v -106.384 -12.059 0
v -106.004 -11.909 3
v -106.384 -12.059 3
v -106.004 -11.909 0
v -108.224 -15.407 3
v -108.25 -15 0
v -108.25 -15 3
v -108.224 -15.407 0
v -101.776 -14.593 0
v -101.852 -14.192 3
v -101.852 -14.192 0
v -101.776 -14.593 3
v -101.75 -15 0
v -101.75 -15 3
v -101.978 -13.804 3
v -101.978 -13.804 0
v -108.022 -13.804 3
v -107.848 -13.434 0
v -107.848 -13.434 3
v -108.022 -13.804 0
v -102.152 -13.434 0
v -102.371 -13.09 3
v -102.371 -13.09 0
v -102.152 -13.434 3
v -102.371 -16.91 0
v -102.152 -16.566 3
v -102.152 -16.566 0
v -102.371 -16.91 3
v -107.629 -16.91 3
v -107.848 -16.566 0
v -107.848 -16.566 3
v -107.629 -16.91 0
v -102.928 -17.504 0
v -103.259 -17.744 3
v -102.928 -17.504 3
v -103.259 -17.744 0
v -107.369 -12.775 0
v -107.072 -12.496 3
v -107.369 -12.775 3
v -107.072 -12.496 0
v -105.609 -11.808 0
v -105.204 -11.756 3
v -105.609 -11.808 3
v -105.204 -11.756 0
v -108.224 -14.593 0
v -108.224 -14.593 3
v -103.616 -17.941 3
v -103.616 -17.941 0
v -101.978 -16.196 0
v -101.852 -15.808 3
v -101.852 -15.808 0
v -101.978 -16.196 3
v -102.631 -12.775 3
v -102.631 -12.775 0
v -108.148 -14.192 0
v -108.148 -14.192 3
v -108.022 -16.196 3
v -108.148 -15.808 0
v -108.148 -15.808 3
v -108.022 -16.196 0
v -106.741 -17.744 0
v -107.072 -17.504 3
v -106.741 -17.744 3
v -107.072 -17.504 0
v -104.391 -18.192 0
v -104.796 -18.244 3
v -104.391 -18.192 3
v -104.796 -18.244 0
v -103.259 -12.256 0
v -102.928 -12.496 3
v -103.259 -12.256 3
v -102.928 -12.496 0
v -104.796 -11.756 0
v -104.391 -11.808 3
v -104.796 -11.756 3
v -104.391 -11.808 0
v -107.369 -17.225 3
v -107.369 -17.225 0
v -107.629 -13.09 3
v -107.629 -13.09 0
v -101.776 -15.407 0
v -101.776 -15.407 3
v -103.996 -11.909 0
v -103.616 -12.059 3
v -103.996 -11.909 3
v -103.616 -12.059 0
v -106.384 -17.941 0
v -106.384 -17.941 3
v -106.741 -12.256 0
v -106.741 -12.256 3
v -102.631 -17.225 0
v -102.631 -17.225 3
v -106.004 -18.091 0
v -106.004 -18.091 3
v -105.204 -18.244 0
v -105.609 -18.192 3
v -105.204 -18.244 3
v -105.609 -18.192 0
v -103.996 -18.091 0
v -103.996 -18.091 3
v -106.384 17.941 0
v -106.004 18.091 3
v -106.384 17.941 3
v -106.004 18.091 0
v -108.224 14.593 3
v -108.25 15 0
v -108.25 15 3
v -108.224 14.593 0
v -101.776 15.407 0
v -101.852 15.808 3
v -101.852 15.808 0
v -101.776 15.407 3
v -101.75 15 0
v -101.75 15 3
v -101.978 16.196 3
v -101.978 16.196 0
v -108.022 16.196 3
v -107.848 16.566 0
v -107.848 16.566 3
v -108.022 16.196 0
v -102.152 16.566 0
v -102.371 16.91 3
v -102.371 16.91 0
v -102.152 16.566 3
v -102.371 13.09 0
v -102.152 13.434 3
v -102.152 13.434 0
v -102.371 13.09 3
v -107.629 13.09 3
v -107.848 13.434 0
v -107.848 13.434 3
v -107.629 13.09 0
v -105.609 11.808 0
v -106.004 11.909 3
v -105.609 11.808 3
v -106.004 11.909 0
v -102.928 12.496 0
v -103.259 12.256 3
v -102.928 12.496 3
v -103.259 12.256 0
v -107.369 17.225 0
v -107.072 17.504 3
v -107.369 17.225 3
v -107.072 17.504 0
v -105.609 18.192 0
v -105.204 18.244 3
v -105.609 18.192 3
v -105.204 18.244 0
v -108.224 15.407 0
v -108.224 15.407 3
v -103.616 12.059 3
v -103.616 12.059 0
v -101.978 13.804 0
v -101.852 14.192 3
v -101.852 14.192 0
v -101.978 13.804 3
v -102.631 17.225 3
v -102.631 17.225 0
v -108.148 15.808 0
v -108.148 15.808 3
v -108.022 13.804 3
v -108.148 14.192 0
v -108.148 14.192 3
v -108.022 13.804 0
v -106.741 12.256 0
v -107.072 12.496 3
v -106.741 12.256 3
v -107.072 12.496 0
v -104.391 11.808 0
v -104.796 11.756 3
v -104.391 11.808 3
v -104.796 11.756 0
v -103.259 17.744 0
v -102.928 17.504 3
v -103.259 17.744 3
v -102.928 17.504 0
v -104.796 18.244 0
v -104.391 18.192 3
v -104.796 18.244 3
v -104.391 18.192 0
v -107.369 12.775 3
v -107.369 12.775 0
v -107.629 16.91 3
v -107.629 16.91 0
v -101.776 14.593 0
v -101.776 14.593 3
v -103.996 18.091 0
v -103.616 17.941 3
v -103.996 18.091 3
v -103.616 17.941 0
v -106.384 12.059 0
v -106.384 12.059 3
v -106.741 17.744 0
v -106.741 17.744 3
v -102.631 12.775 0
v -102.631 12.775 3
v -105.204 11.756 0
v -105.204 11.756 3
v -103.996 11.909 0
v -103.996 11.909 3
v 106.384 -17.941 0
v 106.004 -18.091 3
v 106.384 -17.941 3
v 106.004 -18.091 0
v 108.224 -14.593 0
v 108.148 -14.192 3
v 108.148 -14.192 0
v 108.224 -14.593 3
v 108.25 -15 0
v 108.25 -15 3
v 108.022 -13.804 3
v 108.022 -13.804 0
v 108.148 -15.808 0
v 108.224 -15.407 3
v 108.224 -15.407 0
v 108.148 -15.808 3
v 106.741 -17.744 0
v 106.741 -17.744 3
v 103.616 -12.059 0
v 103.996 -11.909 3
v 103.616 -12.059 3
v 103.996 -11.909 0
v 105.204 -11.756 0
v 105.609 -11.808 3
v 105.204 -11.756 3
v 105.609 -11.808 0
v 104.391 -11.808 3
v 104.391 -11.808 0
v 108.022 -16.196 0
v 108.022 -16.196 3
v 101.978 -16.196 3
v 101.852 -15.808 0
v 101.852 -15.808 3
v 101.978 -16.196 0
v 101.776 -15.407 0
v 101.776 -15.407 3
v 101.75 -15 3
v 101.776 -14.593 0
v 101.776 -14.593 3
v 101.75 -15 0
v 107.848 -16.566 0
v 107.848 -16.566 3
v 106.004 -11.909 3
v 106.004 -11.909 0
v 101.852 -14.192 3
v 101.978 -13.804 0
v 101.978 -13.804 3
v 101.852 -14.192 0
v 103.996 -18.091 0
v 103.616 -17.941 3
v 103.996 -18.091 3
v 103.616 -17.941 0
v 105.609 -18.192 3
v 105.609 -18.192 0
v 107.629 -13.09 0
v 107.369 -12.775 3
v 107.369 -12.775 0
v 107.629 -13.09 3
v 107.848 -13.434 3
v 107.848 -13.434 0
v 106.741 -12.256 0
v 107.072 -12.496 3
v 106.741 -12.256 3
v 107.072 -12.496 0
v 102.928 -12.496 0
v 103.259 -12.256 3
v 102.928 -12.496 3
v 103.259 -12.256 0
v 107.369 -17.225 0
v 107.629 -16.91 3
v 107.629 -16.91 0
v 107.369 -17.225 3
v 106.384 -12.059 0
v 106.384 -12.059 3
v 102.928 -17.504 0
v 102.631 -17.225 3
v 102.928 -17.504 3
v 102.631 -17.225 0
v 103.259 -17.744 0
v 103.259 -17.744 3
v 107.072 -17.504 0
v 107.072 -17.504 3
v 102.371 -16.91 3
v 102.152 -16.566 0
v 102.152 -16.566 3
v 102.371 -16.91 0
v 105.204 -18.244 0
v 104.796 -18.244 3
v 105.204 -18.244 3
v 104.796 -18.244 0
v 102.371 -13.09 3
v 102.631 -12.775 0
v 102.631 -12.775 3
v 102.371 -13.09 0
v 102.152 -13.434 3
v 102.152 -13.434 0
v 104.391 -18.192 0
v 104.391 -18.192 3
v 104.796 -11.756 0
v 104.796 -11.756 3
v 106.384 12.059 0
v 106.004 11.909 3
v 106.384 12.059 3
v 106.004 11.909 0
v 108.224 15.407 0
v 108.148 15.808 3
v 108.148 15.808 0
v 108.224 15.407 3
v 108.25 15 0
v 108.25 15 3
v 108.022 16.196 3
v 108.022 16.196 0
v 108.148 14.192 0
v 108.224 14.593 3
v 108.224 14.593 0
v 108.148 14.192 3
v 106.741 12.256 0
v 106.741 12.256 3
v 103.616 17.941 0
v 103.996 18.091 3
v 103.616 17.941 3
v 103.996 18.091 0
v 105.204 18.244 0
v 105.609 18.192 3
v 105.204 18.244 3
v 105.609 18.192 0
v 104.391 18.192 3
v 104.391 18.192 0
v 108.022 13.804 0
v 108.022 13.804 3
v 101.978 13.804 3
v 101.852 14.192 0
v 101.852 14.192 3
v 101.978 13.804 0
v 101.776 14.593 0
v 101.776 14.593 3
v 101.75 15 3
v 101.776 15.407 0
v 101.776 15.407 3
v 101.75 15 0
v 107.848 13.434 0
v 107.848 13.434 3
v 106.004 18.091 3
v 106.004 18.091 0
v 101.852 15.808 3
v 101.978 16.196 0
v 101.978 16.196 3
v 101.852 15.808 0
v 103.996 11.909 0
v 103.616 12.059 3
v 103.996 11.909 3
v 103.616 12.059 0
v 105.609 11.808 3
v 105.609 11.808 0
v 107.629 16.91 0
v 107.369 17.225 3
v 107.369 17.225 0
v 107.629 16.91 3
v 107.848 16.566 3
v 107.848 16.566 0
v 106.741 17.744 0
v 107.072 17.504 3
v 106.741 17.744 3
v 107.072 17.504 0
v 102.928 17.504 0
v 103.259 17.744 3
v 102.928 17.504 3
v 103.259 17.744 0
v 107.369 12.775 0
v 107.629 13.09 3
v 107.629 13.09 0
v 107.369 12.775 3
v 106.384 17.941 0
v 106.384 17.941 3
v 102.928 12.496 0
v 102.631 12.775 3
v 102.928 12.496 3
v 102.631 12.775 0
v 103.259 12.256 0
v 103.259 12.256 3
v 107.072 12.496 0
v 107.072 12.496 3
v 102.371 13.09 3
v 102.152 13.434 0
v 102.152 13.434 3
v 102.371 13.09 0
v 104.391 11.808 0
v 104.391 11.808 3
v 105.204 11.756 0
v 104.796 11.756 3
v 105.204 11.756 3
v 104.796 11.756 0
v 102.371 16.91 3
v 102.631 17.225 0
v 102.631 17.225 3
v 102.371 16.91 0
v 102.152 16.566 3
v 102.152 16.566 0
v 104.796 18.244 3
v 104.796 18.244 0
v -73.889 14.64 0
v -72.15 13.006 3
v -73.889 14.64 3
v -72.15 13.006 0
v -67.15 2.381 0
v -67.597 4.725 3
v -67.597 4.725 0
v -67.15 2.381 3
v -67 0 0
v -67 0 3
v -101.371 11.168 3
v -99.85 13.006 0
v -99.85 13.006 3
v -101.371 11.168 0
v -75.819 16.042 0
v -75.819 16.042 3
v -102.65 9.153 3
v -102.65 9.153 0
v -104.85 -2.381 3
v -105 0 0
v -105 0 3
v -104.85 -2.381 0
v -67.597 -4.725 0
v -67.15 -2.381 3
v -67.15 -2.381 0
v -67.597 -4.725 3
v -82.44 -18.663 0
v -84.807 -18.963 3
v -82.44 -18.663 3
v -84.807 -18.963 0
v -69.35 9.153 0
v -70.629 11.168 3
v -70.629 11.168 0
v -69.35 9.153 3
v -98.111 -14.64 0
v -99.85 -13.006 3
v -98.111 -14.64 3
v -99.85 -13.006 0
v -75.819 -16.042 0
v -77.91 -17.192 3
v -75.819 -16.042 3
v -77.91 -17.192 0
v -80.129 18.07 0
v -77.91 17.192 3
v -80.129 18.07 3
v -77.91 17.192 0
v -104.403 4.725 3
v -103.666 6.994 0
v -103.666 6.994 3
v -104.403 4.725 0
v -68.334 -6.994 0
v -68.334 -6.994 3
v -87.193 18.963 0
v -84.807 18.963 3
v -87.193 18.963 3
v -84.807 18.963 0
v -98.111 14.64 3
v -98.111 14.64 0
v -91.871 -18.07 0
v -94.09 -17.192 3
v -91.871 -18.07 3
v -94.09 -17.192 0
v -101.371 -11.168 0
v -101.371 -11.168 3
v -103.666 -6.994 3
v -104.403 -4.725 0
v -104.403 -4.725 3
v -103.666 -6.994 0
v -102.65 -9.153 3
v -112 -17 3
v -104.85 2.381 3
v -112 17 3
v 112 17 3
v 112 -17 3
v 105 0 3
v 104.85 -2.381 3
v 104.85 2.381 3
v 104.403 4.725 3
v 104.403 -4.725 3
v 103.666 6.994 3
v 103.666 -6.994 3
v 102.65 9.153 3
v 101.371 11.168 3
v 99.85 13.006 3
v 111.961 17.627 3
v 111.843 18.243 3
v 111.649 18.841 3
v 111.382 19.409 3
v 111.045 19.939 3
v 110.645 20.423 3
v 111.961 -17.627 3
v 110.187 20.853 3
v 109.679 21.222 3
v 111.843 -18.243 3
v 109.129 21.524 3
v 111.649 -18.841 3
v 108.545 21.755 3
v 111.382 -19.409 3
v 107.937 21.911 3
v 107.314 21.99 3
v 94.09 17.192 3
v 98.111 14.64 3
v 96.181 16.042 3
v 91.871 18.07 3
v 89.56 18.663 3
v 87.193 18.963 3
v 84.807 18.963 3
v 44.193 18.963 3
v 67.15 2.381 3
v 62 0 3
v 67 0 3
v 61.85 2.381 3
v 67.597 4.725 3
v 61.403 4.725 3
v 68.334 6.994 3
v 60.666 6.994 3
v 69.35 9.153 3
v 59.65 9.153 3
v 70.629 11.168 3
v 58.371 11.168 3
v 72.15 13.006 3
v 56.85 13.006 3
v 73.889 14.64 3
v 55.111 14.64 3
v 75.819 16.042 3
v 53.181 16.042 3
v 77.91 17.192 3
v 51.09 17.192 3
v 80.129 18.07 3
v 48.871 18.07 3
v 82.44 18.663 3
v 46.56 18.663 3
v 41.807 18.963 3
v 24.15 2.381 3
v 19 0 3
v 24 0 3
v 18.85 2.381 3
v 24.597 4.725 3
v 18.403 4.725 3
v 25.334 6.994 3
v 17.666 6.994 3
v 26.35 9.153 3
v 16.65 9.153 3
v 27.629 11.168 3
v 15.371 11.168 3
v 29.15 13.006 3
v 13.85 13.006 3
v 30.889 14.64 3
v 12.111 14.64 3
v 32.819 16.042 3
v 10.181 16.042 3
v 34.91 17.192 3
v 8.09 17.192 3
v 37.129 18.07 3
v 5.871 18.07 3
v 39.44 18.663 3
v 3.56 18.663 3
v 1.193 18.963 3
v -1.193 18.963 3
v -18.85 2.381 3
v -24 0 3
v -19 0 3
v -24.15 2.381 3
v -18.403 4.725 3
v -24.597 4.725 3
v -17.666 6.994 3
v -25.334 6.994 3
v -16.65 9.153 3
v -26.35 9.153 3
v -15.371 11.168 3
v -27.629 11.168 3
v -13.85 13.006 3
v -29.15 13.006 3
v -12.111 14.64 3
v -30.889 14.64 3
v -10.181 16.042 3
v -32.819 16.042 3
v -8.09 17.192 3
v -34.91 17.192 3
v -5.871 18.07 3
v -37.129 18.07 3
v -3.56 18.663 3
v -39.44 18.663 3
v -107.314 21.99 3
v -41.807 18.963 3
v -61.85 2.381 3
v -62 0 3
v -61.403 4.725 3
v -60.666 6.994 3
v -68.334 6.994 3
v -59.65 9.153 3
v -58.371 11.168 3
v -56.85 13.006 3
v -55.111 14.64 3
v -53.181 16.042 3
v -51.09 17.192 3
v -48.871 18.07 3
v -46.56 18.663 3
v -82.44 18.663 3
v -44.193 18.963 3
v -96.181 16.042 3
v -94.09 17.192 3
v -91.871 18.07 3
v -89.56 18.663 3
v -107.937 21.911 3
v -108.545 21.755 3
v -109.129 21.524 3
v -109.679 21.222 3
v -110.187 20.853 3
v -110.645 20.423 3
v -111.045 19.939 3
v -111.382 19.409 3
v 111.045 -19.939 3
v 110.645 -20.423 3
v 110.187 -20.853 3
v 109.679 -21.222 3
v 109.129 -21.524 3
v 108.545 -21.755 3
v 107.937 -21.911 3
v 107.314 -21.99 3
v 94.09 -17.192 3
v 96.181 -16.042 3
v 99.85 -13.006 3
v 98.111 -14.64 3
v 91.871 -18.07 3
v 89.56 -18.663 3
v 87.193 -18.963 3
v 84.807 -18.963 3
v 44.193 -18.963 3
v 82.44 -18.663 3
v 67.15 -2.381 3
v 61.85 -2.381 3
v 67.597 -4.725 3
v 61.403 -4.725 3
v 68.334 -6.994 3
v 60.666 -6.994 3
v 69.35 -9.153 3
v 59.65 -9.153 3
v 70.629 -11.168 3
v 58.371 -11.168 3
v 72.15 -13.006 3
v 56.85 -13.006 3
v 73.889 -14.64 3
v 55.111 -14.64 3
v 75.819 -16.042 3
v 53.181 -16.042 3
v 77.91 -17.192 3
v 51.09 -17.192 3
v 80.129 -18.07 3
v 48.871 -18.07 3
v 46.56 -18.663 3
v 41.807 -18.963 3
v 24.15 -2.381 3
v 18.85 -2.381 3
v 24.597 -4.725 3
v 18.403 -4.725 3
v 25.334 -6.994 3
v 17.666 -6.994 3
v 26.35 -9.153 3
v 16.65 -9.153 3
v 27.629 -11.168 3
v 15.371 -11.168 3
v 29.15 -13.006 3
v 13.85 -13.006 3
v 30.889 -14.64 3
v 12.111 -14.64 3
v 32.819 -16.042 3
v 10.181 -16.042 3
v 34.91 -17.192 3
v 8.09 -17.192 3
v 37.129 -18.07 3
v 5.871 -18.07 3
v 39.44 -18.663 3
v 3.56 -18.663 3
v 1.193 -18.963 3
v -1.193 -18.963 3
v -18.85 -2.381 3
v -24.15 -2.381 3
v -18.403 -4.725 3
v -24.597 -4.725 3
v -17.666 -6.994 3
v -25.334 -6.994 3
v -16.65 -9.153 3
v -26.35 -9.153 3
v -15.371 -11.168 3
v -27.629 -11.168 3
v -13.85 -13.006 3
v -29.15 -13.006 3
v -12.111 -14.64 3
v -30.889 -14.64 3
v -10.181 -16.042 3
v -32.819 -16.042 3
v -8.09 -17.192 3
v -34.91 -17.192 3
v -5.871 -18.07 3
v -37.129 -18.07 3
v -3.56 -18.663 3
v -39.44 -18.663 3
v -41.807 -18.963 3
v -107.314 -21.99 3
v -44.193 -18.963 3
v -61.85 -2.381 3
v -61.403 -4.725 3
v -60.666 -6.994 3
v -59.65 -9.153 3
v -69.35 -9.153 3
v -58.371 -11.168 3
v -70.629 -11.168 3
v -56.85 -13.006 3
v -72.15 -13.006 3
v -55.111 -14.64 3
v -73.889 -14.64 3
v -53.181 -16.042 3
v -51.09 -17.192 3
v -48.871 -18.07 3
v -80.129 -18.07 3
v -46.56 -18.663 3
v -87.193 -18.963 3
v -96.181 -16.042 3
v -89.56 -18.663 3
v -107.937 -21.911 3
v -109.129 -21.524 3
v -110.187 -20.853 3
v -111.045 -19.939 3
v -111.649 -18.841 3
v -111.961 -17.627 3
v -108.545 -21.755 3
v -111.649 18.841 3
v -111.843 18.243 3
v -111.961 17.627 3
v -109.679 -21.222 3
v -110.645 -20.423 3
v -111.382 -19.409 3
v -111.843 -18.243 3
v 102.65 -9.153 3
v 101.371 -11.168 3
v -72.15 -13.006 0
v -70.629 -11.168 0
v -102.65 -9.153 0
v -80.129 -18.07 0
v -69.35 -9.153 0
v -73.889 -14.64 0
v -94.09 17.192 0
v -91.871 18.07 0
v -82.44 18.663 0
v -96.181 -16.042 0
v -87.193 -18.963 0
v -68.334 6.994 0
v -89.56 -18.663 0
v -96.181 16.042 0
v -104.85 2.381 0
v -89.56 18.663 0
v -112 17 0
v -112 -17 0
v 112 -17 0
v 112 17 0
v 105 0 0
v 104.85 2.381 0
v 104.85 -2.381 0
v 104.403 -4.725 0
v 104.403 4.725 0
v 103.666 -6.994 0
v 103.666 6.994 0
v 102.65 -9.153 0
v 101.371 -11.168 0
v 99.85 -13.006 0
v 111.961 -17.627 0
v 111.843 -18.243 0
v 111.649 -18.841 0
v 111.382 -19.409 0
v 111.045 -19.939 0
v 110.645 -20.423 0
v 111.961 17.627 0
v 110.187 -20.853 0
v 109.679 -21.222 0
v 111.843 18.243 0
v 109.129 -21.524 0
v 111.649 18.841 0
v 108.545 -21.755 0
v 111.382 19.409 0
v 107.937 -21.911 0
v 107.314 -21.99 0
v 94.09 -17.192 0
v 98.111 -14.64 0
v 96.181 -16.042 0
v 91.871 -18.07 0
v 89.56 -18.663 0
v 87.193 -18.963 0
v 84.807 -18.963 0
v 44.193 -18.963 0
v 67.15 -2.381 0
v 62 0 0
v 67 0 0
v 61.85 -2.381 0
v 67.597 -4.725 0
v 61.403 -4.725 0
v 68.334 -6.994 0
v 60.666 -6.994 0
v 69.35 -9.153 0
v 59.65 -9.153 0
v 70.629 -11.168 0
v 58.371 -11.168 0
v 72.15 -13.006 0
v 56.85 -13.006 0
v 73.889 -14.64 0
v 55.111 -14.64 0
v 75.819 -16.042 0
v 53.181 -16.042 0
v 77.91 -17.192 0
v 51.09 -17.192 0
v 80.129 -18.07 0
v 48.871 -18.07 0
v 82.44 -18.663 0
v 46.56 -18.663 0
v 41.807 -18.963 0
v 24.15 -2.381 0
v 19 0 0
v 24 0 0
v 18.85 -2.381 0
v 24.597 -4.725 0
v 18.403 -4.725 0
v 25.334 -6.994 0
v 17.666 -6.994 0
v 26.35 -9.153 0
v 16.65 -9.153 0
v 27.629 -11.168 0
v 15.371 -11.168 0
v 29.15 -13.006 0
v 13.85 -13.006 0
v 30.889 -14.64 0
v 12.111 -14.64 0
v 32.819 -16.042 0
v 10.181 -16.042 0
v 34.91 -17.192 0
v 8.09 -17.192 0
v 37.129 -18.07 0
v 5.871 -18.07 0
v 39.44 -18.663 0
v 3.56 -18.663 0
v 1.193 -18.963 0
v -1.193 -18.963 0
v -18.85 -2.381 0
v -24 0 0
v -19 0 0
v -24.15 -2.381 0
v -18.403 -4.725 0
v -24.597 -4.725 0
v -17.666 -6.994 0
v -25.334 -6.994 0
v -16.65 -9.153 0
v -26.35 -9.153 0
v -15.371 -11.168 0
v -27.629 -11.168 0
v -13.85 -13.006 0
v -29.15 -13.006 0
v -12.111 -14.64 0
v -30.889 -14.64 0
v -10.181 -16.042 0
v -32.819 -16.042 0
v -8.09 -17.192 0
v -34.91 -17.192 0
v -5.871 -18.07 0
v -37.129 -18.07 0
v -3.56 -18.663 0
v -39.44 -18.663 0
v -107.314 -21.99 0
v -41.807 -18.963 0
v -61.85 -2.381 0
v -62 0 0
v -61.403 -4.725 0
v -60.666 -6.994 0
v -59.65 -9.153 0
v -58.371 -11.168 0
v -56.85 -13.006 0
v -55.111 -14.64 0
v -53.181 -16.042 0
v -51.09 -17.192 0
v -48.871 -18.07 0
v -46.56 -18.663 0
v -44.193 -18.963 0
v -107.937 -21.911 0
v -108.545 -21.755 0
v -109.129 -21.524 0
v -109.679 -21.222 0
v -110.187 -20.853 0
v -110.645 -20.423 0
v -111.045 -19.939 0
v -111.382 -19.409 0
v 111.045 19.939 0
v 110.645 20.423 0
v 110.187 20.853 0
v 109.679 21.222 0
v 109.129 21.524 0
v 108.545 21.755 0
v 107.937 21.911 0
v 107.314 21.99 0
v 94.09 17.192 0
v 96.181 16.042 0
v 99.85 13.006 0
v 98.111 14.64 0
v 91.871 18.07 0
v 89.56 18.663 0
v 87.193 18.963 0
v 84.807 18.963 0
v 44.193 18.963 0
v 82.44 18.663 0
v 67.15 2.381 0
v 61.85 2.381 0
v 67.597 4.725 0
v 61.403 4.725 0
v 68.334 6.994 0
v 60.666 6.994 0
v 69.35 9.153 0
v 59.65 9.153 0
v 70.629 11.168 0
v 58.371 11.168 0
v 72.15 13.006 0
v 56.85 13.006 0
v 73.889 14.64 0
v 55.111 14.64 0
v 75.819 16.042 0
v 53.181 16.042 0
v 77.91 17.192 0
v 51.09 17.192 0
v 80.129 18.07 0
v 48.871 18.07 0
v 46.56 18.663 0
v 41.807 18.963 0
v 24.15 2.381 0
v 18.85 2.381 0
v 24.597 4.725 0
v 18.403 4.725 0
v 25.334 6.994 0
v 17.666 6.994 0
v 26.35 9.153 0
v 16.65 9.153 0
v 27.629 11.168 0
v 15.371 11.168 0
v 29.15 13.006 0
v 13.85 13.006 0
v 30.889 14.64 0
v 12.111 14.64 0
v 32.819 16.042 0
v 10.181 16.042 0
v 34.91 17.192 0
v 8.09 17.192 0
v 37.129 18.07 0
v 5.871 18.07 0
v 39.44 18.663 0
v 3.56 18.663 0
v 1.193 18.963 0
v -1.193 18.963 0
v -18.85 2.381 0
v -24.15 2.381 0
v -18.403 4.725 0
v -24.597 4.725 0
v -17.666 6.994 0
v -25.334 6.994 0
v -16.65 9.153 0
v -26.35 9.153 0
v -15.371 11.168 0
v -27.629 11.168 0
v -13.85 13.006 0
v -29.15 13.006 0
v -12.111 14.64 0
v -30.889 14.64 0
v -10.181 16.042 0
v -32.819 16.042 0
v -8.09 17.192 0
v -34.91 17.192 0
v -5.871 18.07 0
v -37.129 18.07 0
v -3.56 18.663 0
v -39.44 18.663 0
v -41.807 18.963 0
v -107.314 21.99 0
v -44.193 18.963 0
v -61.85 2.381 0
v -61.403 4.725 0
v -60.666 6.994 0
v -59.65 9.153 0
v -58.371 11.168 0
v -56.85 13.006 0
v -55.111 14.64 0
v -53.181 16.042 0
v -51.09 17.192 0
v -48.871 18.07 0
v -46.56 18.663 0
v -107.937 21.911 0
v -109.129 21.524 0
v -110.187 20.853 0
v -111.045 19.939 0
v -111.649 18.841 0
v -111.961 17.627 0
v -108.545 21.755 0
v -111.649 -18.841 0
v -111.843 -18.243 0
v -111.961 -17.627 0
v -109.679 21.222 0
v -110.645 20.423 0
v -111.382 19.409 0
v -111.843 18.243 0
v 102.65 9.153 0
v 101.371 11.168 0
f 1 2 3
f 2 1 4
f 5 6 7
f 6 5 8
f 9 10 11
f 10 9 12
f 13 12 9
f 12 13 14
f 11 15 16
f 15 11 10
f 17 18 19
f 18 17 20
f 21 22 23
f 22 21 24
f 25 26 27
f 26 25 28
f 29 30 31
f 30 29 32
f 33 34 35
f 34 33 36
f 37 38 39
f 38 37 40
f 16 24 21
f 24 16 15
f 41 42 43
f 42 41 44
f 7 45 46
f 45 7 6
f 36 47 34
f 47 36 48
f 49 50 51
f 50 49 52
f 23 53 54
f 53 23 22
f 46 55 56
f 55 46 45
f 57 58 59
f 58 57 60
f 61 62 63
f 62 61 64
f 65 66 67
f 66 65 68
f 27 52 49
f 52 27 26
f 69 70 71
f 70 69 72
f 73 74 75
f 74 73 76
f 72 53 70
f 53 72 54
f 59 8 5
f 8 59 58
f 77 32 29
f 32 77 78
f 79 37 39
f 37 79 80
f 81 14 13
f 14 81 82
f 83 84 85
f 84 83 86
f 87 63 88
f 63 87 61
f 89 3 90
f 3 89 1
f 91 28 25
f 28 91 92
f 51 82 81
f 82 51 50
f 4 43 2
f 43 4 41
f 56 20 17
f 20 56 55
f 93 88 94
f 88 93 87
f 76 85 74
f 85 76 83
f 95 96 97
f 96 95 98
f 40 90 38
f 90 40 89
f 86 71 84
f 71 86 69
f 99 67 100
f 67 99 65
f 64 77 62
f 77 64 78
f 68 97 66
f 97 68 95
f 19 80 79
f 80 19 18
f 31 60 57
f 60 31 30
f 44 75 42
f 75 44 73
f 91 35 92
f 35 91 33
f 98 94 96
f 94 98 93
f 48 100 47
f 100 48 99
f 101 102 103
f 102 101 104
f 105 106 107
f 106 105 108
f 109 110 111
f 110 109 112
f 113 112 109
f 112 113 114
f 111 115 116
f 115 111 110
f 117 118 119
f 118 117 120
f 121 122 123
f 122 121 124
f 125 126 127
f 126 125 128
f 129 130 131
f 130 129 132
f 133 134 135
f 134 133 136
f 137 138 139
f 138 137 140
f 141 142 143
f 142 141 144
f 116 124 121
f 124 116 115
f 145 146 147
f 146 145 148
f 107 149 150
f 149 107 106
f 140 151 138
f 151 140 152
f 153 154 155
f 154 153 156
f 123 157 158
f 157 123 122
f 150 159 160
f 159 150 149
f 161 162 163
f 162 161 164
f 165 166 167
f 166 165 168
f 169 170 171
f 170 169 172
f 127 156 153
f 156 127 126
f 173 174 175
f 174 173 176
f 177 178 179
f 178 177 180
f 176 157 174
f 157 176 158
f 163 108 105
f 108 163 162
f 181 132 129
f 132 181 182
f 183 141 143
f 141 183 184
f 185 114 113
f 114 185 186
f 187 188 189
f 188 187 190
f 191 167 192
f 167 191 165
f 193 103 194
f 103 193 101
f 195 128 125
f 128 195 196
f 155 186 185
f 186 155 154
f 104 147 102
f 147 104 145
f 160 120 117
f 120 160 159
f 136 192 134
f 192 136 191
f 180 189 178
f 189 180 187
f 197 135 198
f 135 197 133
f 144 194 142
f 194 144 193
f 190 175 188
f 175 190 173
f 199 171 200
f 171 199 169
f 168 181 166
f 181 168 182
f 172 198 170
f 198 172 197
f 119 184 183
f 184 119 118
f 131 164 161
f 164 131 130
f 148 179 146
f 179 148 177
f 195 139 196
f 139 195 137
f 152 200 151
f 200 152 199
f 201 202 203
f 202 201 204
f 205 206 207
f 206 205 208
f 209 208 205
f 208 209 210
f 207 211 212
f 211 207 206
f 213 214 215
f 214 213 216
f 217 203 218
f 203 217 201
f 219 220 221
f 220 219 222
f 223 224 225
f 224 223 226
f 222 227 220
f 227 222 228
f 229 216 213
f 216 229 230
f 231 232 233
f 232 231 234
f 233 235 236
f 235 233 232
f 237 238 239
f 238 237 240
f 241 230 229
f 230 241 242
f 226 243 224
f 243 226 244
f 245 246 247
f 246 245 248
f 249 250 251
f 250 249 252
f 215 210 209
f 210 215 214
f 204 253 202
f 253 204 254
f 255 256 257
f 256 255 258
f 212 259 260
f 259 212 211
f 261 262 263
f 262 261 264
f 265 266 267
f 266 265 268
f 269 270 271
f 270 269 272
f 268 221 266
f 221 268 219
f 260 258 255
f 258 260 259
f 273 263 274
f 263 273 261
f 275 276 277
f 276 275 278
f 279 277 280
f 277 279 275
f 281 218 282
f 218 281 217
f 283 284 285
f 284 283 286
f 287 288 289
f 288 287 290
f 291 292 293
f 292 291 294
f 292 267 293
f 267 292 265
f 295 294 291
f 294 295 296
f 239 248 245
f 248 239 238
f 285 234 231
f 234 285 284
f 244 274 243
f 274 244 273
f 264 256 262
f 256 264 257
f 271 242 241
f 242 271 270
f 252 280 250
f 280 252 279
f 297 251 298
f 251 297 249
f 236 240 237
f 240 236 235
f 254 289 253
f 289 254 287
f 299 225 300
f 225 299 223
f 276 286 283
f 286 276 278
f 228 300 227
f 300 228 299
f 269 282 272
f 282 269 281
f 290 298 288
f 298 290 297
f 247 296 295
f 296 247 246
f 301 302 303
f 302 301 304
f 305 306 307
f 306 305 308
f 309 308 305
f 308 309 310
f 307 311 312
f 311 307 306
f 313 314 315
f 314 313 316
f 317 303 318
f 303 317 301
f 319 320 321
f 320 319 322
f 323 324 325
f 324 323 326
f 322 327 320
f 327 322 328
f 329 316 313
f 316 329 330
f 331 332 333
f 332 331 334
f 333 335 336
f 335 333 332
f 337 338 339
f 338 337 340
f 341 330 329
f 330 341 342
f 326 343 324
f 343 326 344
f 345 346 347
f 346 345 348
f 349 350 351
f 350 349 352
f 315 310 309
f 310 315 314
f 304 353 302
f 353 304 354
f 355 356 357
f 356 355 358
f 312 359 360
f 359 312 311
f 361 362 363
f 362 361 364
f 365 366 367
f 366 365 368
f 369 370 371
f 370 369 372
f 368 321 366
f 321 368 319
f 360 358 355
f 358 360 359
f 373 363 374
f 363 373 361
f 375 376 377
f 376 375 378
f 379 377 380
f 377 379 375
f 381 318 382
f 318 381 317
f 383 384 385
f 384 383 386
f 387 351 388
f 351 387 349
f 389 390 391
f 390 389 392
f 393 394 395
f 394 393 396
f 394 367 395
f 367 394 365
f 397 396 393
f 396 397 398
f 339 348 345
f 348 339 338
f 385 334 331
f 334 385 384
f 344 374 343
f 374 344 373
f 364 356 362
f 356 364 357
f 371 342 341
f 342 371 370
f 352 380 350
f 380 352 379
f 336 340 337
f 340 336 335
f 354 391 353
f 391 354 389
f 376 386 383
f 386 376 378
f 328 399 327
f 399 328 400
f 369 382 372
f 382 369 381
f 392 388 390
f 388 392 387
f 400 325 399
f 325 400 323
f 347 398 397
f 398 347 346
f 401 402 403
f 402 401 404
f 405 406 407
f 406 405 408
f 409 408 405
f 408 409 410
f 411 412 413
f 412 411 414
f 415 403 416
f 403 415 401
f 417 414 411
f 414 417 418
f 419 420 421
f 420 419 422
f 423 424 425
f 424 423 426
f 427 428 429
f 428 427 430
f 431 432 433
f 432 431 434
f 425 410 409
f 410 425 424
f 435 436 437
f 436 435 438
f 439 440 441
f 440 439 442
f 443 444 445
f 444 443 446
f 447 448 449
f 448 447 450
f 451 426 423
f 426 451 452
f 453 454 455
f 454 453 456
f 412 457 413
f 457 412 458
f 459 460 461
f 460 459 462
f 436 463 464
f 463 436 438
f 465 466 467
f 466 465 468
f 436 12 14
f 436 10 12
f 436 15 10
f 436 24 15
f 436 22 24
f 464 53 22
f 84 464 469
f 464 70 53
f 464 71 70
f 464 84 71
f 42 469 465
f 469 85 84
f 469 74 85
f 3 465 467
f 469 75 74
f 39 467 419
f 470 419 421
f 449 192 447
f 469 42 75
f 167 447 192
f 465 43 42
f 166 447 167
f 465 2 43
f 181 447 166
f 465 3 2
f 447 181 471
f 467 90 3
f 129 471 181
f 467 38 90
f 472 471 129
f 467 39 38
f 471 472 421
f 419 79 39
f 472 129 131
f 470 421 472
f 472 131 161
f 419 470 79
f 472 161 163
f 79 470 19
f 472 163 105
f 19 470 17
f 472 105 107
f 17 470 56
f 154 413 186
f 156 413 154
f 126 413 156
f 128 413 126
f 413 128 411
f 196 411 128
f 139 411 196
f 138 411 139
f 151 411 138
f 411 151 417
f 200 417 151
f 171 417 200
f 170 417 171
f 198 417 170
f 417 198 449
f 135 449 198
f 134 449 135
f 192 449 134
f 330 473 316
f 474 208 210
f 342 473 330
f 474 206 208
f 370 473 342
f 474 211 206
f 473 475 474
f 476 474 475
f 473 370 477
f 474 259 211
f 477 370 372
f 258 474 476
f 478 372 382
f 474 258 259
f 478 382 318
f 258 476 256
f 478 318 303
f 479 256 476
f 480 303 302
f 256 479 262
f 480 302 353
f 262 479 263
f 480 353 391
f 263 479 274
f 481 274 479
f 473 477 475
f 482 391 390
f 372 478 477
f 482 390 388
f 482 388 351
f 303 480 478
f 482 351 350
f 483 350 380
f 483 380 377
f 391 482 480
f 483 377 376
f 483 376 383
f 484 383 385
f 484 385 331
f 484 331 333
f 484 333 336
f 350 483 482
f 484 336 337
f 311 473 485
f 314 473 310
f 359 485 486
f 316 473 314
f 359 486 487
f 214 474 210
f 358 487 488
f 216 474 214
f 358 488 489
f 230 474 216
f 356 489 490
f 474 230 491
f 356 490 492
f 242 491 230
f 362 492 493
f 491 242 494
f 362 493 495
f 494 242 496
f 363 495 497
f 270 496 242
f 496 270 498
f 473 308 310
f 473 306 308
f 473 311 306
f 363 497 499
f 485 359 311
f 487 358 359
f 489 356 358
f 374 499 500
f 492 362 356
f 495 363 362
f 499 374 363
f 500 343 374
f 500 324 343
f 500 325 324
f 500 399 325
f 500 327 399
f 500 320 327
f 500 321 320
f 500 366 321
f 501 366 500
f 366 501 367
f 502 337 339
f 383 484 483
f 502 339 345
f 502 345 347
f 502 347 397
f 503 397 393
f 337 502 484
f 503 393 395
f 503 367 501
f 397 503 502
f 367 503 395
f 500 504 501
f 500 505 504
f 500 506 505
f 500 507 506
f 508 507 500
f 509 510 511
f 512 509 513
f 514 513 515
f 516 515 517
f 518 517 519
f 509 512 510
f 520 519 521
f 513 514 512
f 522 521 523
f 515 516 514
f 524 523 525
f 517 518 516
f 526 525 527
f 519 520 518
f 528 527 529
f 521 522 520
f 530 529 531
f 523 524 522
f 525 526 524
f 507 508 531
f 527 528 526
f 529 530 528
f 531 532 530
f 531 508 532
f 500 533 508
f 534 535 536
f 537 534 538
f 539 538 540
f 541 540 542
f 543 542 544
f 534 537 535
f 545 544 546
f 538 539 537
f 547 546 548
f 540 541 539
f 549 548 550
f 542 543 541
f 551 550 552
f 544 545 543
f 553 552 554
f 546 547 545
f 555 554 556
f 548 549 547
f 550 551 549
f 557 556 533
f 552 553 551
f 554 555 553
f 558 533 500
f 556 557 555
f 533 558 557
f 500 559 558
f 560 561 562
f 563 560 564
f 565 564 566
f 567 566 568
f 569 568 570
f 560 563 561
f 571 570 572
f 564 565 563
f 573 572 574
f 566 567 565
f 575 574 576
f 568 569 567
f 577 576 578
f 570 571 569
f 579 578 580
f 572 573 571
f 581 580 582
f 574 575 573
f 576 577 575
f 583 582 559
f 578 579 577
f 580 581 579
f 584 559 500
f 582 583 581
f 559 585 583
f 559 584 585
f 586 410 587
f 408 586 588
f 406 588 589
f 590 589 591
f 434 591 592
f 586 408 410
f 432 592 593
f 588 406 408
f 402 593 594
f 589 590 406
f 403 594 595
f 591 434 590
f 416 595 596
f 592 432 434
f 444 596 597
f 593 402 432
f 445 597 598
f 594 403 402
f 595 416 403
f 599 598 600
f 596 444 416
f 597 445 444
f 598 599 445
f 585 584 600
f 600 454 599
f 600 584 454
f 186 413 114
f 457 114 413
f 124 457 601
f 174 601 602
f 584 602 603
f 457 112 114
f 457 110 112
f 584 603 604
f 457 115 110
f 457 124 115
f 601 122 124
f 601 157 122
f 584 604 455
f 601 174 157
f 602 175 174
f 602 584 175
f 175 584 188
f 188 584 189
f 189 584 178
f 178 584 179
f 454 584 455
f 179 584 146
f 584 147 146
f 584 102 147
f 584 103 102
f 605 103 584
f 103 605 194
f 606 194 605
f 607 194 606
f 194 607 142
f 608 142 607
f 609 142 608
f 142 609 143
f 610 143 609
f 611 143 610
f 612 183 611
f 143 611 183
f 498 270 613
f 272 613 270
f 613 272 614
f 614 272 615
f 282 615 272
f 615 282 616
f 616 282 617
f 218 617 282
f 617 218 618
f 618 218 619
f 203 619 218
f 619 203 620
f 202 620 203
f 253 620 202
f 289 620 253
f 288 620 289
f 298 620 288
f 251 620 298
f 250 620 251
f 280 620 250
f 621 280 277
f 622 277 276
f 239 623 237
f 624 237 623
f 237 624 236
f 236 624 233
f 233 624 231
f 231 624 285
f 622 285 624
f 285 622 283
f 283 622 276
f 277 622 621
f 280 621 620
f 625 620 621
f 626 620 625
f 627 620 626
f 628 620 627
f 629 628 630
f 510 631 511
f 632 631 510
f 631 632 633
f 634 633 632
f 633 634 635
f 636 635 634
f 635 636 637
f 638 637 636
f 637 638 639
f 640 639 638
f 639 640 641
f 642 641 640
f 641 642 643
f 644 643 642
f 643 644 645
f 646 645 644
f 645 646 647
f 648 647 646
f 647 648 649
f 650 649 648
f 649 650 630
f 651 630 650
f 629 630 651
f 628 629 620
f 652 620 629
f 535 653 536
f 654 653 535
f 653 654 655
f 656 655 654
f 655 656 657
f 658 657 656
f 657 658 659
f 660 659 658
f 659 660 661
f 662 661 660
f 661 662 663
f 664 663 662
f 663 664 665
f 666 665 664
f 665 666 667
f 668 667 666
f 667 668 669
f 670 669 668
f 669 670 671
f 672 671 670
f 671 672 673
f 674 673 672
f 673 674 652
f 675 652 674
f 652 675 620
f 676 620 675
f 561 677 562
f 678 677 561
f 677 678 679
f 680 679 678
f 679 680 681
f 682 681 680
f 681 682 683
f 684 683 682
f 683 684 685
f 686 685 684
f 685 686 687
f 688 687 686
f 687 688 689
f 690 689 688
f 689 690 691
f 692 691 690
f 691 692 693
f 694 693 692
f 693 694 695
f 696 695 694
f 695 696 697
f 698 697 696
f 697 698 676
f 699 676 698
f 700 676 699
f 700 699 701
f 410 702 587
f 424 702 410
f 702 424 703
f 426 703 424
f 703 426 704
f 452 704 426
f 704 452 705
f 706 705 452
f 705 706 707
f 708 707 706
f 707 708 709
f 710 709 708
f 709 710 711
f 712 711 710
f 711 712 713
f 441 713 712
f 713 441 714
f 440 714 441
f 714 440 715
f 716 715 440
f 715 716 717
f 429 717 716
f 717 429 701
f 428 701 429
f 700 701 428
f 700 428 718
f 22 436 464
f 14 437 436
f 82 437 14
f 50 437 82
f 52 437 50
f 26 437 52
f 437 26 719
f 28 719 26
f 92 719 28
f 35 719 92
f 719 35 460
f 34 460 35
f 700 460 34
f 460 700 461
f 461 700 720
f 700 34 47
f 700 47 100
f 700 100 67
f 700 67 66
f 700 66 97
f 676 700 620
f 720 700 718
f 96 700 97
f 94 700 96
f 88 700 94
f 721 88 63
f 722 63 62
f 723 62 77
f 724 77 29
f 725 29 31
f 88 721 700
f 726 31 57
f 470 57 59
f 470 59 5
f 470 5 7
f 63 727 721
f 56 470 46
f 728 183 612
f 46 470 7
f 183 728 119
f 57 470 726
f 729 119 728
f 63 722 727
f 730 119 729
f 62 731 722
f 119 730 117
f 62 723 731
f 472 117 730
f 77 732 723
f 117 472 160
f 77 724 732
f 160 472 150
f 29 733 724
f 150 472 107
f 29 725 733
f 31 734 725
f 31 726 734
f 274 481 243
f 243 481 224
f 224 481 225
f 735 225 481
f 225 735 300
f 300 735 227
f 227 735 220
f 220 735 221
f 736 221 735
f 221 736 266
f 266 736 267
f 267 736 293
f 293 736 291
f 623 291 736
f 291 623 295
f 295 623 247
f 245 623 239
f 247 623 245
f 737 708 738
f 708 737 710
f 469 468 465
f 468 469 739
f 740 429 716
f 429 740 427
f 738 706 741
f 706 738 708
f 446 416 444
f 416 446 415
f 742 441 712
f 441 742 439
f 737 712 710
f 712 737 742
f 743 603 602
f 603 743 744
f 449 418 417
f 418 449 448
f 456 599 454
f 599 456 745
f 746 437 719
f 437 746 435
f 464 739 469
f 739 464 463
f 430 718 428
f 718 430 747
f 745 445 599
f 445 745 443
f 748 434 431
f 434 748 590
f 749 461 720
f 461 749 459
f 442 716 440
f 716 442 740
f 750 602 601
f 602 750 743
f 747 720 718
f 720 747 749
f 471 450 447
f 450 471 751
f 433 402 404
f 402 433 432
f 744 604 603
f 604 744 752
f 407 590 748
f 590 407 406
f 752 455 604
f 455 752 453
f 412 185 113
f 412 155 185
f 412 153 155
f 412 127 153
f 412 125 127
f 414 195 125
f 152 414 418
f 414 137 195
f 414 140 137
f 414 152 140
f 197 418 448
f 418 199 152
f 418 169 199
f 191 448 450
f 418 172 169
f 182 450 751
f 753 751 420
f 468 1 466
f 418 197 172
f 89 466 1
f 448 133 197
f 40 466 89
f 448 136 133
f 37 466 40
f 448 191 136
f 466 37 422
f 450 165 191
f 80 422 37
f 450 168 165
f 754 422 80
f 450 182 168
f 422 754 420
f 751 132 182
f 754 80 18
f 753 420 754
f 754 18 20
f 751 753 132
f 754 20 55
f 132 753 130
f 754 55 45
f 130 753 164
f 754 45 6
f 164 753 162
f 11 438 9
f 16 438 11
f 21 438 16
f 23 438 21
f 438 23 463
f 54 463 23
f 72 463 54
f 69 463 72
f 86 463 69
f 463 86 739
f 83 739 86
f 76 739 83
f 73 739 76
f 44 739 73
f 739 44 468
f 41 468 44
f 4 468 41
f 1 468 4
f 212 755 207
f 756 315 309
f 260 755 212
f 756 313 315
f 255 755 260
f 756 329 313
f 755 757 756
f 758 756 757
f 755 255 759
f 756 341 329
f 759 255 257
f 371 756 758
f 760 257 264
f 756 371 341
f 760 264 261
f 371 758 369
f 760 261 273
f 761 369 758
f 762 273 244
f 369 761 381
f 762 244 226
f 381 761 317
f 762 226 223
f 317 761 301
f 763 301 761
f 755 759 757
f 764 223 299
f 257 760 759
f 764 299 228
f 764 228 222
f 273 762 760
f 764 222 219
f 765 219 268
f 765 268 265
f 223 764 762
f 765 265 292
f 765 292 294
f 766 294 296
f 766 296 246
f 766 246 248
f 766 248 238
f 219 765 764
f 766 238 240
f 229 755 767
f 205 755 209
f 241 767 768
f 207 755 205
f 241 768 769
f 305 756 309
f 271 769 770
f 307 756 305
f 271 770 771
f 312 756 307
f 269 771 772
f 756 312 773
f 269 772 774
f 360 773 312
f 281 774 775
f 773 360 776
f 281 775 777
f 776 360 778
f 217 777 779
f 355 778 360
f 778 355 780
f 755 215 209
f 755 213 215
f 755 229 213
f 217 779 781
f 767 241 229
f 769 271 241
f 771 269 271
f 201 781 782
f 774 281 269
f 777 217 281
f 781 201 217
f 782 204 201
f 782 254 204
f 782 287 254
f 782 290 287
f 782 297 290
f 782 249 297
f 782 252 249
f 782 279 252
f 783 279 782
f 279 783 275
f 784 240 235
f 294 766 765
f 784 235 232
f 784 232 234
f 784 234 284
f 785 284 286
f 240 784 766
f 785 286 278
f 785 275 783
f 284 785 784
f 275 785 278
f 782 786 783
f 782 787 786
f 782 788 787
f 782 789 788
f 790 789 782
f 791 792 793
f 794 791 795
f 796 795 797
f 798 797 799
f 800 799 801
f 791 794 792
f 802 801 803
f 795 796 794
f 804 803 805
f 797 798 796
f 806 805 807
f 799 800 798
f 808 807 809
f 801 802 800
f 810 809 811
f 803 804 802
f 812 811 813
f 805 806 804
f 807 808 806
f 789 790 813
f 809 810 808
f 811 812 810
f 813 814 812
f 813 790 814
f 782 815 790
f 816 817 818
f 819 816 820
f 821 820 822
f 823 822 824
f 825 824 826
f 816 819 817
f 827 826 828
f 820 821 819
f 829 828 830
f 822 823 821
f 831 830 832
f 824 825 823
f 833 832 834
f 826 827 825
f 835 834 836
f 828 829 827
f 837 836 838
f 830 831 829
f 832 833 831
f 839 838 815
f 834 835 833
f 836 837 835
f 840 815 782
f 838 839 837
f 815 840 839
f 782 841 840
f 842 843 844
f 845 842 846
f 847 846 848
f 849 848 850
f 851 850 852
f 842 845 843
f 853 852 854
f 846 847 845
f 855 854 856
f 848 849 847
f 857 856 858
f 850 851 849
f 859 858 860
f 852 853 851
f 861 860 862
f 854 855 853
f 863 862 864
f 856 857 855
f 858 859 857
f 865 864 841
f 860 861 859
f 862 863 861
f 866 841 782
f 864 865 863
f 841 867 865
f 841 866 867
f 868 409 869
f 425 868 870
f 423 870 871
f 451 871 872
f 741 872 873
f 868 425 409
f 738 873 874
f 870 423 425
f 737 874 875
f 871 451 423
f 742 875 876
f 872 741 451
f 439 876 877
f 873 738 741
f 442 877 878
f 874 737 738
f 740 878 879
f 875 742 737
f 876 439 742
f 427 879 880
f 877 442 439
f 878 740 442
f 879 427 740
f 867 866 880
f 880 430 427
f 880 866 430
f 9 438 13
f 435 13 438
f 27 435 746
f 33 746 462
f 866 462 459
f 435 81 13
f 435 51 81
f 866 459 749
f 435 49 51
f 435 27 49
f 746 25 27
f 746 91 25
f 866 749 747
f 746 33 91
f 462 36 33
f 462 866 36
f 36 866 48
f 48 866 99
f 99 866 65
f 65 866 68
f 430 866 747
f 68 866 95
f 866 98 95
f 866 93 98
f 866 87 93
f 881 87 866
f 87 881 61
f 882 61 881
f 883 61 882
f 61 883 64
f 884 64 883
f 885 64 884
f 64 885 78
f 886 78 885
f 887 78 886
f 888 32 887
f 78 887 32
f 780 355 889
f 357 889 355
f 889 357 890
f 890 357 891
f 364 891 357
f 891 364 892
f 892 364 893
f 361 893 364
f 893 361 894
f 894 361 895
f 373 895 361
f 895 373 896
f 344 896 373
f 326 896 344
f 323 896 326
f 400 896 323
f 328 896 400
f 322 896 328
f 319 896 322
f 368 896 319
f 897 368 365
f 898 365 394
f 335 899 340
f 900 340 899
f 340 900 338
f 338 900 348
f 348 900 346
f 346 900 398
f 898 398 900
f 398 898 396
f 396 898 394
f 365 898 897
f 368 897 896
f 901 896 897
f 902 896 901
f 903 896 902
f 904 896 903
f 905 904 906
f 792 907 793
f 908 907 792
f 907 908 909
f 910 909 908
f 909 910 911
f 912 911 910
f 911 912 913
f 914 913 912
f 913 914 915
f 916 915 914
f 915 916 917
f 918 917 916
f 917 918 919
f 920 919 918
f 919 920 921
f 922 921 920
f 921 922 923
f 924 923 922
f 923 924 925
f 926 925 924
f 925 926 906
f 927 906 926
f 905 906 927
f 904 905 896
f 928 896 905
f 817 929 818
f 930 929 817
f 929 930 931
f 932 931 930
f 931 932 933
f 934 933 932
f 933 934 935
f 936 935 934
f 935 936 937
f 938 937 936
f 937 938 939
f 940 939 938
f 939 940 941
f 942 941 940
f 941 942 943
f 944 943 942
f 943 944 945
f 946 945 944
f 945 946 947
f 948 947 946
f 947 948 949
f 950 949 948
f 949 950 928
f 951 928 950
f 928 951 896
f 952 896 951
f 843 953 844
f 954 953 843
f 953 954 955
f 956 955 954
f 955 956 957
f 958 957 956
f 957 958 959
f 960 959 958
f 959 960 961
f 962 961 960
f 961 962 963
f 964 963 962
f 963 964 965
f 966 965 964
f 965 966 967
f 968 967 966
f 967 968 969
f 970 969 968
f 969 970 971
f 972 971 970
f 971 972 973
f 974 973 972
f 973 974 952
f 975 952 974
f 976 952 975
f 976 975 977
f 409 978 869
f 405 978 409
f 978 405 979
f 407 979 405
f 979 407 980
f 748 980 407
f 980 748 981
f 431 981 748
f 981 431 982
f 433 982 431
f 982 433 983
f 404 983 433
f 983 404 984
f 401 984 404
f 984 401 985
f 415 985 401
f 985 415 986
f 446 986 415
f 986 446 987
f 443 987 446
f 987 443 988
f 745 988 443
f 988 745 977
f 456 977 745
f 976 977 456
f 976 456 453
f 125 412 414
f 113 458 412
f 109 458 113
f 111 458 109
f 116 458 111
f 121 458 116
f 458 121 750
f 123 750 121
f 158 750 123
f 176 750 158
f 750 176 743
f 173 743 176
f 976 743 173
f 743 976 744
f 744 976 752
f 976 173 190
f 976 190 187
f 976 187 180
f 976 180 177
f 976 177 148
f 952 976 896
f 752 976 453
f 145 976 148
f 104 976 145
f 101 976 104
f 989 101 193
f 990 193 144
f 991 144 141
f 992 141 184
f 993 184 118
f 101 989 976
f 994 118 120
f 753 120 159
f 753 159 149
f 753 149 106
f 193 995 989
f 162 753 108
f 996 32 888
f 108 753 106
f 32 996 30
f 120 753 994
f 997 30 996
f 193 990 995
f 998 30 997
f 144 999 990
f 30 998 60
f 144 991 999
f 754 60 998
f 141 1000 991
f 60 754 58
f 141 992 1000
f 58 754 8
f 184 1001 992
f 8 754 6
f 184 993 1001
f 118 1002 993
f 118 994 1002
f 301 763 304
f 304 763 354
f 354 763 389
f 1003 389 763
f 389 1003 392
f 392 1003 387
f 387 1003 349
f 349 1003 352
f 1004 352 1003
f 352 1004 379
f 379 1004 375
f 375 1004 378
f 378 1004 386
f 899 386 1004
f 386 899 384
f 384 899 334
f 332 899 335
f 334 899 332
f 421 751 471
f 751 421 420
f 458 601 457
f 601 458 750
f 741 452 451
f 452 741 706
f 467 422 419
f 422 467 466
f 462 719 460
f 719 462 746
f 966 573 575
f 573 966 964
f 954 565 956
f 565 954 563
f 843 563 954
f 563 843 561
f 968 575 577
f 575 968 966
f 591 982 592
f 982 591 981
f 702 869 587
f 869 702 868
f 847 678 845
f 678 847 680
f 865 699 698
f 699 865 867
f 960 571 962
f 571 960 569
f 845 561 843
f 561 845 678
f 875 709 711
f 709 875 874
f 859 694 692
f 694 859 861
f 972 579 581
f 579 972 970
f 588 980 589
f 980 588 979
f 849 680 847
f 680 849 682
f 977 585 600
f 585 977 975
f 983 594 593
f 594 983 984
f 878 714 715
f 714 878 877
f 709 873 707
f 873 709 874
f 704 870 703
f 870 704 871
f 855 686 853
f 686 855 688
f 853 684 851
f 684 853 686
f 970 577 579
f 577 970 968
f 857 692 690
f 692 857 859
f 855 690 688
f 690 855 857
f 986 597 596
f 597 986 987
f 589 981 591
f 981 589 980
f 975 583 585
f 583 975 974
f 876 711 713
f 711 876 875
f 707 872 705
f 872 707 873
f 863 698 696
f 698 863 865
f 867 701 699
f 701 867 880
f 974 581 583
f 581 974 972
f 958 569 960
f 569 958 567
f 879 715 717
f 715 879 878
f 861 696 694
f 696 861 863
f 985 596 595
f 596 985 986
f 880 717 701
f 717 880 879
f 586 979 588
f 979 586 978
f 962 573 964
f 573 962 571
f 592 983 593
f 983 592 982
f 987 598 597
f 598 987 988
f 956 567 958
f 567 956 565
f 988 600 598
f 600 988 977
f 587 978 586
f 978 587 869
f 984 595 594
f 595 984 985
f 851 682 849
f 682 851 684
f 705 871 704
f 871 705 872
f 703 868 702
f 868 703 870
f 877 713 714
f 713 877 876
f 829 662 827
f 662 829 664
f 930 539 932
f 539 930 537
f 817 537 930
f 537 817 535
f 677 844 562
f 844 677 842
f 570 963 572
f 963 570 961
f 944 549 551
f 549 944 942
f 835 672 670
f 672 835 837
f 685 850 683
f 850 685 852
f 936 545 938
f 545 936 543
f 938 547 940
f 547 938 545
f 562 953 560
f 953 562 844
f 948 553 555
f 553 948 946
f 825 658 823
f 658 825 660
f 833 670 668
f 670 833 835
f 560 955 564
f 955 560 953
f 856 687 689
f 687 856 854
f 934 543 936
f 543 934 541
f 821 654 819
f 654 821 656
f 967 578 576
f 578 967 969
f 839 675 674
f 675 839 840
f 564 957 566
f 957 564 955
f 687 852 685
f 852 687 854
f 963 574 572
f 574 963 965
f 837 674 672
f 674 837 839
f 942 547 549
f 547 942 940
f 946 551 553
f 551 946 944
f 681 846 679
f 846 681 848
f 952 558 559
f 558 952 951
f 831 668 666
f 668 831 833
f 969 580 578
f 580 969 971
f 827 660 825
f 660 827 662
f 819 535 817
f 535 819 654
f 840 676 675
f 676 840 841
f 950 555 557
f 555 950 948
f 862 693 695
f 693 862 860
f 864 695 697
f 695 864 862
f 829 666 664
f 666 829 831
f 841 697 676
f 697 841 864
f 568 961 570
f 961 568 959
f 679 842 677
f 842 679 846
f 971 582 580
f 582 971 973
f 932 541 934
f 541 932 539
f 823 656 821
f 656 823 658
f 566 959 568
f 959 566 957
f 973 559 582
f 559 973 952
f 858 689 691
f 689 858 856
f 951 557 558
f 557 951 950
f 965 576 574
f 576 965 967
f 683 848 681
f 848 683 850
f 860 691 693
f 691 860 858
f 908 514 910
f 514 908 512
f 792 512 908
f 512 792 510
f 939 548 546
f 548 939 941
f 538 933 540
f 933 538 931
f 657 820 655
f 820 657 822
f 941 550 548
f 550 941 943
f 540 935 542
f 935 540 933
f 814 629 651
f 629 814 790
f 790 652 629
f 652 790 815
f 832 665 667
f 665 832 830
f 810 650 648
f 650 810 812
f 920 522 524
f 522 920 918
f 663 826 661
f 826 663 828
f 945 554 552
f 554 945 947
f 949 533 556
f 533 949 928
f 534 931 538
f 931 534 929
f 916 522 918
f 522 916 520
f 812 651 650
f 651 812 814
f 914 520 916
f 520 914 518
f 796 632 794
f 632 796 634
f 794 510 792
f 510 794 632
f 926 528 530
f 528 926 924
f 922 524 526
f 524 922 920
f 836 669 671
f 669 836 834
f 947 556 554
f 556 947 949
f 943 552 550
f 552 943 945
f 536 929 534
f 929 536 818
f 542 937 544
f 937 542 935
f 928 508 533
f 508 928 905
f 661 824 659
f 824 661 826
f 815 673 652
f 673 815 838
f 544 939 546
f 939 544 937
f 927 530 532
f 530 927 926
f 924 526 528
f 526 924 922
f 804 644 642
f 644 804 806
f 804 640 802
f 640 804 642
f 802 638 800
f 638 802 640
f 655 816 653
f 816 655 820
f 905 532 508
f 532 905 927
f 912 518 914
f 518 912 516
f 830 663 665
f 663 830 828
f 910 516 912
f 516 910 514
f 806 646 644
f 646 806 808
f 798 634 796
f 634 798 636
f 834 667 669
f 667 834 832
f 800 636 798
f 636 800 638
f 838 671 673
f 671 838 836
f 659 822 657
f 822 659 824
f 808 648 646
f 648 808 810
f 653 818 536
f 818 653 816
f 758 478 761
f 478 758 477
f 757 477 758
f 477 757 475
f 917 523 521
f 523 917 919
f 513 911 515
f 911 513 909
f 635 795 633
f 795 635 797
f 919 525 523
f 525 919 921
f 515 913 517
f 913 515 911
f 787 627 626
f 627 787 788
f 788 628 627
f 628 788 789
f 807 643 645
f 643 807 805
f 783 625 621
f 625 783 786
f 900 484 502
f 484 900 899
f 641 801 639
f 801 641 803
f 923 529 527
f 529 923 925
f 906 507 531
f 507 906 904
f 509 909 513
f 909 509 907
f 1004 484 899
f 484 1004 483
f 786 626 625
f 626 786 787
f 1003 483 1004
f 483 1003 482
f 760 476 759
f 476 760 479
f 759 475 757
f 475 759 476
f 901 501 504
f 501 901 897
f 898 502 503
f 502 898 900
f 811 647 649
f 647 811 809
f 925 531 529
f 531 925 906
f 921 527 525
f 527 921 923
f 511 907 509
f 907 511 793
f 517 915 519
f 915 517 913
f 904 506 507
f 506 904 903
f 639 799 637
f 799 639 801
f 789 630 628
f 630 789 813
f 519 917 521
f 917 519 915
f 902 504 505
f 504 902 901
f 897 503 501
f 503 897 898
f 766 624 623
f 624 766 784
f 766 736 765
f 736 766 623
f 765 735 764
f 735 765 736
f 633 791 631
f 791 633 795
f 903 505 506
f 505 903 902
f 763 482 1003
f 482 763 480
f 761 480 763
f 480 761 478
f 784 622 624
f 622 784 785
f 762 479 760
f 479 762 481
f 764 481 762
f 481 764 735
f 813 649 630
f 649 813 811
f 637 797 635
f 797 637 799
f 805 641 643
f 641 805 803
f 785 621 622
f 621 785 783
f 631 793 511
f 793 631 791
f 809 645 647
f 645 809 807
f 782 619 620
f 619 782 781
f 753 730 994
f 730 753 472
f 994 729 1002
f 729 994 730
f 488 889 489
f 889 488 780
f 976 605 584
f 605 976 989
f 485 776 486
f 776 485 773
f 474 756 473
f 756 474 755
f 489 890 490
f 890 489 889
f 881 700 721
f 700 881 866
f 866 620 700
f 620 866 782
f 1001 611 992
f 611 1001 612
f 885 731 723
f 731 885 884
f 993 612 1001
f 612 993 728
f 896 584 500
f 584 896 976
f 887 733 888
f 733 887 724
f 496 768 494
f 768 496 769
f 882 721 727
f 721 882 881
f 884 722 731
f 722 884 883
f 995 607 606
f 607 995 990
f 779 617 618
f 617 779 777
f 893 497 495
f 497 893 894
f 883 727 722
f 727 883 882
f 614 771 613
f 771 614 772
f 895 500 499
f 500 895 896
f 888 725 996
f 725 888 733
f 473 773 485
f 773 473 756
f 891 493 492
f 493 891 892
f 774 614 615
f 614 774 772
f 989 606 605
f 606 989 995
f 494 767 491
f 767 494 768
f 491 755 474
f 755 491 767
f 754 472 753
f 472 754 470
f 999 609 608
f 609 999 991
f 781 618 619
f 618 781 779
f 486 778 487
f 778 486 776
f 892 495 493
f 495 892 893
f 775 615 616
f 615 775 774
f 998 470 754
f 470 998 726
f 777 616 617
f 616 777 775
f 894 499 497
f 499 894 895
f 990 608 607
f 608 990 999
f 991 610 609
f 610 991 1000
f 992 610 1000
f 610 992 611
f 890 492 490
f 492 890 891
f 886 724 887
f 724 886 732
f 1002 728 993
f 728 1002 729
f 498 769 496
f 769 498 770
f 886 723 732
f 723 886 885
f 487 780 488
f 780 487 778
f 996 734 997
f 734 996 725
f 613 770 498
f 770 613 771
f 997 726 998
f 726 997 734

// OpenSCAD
$fn = 50;


difference() {
	union() {
		hull() {
			translate(v = [-107.0000000000, 17.0000000000, 0]) {
				cylinder(h = 3, r = 5);
			}
			translate(v = [107.0000000000, 17.0000000000, 0]) {
				cylinder(h = 3, r = 5);
			}
			translate(v = [-107.0000000000, -17.0000000000, 0]) {
				cylinder(h = 3, r = 5);
			}
			translate(v = [107.0000000000, -17.0000000000, 0]) {
				cylinder(h = 3, r = 5);
			}
		}
	}
	union() {
		#translate(v = [-105.0000000000, -15.0000000000, -100.0000000000]) {
			cylinder(h = 200, r = 3.2500000000);
		}
		#translate(v = [-105.0000000000, 15.0000000000, -100.0000000000]) {
			cylinder(h = 200, r = 3.2500000000);
		}
		#translate(v = [105.0000000000, -15.0000000000, -100.0000000000]) {
			cylinder(h = 200, r = 3.2500000000);
		}
		#translate(v = [105.0000000000, 15.0000000000, -100.0000000000]) {
			cylinder(h = 200, r = 3.2500000000);
		}
		#translate(v = [-86.0000000000, 0, 0]) {
			cylinder(h = 3, r = 19.0000000000);
		}
		#translate(v = [-43.0000000000, 0, 0]) {
			cylinder(h = 3, r = 19.0000000000);
		}
		#cylinder(h = 3, r = 19.0000000000);
		#translate(v = [43.0000000000, 0, 0]) {
			cylinder(h = 3, r = 19.0000000000);
		}
		#translate(v = [86.0000000000, 0, 0]) {
			cylinder(h = 3, r = 19.0000000000);
		}
	}
}
